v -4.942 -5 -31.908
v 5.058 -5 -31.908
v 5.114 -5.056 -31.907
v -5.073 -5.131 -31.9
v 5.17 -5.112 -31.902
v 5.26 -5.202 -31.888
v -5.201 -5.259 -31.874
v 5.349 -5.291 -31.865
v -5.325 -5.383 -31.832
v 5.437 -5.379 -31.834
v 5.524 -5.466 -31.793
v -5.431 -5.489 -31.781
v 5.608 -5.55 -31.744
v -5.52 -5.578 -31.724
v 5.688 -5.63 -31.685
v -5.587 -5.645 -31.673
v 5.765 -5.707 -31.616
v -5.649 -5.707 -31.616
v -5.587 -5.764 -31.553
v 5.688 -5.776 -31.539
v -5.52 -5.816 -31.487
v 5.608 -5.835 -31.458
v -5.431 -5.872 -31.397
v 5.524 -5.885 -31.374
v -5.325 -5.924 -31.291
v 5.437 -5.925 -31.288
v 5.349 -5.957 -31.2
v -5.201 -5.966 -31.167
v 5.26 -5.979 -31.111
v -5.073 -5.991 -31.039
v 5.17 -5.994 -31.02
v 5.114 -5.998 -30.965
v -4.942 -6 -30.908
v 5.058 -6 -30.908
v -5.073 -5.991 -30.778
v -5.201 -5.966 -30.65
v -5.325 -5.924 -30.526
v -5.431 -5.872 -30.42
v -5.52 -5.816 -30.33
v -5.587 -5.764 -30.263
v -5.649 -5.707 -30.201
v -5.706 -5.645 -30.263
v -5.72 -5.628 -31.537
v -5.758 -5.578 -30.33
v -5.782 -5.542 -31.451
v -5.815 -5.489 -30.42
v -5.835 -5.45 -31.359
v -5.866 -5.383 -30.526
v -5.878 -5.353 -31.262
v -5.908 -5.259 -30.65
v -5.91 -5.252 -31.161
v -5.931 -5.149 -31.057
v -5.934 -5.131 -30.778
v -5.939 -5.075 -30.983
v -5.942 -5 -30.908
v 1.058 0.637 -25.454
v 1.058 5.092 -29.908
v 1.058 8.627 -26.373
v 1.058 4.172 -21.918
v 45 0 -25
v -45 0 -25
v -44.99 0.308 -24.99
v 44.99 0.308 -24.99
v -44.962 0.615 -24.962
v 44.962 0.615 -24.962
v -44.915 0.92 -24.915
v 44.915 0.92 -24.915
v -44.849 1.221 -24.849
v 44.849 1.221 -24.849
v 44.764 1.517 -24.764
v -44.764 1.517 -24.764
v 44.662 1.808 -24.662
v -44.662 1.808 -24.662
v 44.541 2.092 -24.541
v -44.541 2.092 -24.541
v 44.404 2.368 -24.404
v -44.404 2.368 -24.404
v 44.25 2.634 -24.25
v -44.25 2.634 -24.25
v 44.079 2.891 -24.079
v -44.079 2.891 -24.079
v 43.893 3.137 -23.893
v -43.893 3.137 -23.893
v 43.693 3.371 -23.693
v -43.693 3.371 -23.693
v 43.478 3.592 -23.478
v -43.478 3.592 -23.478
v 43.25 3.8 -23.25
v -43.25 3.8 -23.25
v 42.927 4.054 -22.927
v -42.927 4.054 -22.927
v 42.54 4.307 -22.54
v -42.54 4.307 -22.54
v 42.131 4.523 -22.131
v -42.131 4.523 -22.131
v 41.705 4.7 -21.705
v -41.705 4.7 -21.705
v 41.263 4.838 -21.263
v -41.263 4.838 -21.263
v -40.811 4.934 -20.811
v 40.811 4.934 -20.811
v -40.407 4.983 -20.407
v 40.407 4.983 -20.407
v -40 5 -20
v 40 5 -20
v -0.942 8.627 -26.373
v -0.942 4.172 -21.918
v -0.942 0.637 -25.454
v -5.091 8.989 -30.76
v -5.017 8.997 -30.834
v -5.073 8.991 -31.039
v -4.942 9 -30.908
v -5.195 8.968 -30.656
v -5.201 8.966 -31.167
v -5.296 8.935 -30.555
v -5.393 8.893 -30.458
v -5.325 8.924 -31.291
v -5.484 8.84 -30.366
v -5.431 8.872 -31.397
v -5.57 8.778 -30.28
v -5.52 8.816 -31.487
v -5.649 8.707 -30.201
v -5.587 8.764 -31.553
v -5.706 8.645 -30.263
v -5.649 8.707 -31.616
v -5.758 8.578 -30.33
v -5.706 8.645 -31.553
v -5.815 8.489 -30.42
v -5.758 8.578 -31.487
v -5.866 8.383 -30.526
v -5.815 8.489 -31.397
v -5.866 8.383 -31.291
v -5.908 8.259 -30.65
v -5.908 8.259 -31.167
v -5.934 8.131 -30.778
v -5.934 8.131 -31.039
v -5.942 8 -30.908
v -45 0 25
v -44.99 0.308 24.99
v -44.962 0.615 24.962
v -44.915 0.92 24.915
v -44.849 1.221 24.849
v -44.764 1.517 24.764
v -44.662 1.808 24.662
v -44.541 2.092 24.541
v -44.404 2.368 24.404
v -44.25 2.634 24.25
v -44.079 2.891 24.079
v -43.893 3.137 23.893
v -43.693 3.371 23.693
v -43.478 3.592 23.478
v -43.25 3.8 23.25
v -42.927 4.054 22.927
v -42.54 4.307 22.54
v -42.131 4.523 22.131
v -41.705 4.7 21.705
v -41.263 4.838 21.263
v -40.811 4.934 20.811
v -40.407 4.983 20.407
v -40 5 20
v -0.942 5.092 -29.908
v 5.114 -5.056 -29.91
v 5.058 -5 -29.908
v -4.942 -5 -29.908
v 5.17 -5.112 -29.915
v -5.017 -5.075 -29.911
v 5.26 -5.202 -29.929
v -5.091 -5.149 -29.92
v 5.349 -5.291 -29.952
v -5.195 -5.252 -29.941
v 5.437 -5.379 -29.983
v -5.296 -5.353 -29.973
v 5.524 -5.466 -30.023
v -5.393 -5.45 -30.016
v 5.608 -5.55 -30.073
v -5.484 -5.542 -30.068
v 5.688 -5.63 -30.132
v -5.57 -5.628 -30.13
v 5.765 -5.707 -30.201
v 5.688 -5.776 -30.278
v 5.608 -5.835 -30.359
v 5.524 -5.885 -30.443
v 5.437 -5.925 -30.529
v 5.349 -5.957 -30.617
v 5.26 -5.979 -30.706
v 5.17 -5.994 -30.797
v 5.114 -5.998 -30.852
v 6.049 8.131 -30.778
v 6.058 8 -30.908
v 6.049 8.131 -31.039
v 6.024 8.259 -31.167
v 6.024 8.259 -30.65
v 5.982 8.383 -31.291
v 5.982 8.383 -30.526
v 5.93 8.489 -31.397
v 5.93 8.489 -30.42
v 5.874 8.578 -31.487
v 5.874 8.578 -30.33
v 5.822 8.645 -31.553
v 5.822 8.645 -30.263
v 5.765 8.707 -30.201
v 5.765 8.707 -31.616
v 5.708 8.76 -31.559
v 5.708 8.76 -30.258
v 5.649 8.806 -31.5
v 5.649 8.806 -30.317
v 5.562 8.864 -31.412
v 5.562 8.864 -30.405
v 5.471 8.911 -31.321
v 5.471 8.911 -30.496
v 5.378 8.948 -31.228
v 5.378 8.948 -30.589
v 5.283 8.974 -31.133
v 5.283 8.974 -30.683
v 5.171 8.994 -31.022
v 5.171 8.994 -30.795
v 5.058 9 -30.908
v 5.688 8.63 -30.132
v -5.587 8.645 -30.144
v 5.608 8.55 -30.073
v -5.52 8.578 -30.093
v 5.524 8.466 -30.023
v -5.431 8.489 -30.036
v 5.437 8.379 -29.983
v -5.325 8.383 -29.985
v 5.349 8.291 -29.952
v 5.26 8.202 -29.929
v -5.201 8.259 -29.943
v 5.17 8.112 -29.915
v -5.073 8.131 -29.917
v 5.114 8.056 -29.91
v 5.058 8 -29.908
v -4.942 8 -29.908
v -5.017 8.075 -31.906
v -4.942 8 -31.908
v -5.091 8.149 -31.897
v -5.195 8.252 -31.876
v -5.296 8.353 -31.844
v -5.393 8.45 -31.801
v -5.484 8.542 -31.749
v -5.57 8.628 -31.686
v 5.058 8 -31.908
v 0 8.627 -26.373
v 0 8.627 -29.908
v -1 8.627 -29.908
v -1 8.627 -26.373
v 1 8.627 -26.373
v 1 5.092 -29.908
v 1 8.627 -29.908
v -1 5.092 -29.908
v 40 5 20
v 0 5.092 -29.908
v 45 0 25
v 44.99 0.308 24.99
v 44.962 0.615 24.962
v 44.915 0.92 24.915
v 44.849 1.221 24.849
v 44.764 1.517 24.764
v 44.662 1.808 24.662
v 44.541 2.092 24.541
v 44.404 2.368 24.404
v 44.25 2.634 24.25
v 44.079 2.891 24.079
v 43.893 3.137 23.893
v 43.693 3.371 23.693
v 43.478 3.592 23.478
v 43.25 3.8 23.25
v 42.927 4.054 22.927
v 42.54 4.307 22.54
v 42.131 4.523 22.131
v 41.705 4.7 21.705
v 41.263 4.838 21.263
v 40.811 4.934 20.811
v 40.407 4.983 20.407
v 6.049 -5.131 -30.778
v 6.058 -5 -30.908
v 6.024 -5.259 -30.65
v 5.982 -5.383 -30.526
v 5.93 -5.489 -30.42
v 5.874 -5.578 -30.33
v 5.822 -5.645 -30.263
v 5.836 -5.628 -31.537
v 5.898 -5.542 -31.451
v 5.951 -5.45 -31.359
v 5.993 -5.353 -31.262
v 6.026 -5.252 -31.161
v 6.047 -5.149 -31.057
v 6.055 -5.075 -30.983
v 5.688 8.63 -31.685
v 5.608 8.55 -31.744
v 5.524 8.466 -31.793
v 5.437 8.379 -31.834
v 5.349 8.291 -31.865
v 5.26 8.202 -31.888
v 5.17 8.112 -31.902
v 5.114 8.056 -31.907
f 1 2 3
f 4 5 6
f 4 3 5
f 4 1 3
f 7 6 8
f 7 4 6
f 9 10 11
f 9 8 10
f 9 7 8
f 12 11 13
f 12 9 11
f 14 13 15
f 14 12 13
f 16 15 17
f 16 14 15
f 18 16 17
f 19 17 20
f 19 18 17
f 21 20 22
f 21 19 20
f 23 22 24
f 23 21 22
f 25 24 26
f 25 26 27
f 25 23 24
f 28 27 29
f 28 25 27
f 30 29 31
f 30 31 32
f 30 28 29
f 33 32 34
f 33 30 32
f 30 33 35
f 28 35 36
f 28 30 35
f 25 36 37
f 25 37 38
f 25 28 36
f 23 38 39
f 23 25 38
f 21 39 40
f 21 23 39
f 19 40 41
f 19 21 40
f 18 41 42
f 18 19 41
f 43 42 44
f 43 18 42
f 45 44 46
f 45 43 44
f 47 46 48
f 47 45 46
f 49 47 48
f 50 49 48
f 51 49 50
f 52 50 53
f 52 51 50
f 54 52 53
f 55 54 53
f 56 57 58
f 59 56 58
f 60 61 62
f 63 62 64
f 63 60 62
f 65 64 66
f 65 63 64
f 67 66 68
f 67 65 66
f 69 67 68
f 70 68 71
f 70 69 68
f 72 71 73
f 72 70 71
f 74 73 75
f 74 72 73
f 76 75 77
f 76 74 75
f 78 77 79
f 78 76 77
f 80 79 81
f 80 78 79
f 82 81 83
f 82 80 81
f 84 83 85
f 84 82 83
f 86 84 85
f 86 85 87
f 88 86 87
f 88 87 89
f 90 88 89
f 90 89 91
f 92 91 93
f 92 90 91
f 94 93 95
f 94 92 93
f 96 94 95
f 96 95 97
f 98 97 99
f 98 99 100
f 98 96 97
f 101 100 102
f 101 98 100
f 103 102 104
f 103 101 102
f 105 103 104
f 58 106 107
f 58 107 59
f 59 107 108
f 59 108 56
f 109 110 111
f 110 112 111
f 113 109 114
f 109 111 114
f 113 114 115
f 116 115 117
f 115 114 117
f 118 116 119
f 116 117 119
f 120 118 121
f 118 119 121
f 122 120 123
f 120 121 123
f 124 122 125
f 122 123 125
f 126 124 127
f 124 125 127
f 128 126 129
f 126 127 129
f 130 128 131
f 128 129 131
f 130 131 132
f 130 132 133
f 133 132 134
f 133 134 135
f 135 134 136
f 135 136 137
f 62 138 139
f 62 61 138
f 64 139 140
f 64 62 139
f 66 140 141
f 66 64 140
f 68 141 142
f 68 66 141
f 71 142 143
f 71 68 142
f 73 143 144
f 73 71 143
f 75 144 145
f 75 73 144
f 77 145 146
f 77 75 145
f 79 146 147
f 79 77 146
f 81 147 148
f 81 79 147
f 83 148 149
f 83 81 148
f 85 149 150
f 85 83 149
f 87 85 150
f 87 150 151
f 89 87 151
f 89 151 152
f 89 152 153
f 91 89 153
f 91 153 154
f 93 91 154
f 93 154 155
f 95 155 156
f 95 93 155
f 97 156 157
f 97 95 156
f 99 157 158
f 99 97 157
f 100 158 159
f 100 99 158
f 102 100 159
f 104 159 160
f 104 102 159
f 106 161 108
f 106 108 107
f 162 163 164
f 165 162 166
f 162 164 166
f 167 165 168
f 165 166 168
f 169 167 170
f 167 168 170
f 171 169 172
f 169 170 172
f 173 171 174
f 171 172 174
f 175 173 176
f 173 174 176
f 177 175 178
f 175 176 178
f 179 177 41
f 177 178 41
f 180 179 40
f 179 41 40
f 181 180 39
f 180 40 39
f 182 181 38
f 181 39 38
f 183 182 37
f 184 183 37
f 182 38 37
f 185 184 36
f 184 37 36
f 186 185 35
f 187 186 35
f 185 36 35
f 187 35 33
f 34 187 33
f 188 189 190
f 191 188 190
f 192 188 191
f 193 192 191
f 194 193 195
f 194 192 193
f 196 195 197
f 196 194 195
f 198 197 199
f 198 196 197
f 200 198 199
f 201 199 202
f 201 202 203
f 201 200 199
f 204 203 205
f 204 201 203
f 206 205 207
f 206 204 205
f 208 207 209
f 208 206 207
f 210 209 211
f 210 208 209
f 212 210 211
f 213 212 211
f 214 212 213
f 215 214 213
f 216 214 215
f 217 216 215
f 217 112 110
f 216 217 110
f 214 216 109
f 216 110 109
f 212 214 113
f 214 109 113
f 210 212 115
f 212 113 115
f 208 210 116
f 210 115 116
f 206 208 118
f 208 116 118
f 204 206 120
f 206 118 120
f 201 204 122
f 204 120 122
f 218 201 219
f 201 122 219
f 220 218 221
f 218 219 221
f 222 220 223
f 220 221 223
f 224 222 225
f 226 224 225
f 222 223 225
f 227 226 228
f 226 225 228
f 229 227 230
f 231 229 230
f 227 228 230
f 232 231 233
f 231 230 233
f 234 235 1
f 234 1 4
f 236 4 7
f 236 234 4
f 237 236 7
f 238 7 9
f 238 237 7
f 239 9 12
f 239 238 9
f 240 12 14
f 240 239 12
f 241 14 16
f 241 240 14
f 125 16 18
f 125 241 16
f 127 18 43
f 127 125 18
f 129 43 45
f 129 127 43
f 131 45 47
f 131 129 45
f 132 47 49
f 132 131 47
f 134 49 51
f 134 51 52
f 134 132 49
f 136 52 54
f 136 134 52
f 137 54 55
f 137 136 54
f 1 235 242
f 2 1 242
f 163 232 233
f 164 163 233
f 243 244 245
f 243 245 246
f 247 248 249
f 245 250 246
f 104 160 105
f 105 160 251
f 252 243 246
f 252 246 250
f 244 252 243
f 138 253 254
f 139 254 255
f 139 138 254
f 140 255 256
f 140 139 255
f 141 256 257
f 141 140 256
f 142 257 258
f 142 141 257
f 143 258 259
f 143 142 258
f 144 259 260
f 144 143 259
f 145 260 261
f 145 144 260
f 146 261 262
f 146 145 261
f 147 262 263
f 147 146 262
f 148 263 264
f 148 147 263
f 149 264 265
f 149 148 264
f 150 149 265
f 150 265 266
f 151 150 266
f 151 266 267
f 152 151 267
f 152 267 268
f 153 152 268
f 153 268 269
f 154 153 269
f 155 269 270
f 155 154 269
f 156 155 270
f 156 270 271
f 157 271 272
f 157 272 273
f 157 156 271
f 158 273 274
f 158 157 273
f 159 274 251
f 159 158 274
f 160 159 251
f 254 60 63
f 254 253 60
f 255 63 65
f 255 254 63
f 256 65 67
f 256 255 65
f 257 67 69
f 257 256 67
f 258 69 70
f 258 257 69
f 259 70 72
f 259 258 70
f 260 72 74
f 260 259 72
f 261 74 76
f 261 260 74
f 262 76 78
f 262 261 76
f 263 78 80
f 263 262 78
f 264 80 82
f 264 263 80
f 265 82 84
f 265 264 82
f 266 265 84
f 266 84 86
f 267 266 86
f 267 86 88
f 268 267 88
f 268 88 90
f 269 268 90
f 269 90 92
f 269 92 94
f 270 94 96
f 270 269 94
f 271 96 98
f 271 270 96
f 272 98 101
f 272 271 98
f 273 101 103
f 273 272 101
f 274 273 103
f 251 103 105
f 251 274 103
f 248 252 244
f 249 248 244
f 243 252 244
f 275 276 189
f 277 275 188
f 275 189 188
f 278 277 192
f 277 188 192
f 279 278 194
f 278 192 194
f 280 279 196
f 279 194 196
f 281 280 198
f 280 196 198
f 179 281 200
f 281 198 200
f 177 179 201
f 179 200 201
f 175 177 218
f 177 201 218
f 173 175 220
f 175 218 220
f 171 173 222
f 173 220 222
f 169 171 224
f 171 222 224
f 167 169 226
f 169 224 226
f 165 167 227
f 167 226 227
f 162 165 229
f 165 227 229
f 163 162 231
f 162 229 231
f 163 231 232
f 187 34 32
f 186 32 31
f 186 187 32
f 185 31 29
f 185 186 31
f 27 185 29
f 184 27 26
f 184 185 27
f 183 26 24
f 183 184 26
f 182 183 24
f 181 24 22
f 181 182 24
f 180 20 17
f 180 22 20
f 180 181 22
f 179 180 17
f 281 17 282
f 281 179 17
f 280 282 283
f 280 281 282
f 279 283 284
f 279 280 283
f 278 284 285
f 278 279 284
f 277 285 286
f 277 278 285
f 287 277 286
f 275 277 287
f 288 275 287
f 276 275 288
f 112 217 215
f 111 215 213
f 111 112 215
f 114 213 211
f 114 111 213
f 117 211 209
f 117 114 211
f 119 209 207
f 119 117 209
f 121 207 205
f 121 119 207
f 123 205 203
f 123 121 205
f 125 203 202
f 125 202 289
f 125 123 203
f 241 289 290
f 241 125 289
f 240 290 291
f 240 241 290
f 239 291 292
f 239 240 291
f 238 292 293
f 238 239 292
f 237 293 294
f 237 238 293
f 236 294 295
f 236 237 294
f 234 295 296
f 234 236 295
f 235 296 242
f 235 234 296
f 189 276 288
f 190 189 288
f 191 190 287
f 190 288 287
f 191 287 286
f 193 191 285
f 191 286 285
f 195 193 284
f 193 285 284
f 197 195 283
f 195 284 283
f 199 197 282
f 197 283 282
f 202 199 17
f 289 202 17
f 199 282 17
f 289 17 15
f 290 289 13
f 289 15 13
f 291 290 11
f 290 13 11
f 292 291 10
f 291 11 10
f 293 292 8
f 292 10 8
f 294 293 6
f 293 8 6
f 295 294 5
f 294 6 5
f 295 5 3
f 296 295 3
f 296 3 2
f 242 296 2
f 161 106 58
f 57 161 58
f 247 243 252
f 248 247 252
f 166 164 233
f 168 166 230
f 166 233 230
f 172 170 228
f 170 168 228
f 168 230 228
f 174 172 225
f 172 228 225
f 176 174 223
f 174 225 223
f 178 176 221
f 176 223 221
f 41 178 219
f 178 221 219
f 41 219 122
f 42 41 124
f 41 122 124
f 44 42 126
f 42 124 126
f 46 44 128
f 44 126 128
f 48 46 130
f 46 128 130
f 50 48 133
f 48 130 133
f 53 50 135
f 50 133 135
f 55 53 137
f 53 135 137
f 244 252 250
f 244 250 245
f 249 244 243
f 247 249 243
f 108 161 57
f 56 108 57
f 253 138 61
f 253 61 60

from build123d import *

# Parameters (mm, degrees)
F1_DEPTH     = 5
F3_DEPTH     = 15
F4_R         = 4.99999
F6_W         = 2
F6_H         = 5
F7_DEPTH     = 6.3
F10_DEPTH    = 9
F12_DEPTH    = 1
F13_DEPTH    = 1
F14_DEPTH    = 15
F15_R        = 0.99999
F16_T1_DEPTH = 16.00001
F16_T3_DEPTH = 7
F17_T1_DEPTH = 19
F17_T3_DEPTH = 7
F18_T1_DEPTH = 15.00001


# Not quite as in the source:
# - a fillet or chamfer that OpenCascade refuses, or shapes differently, is made with other operations: its cross-section is extruded or revolved along the edge and cut away or added
# - a fillet or chamfer is up to 0.001 mm smaller than in the source, because OpenCascade refuses the exact size


with BuildPart() as f1:
    # F0 (on Front) → F1 (new body)
    with BuildSketch(Plane.XZ):
        Polygon((45, 25), (-45, 25), (-45, -25), (-2.5, -25), (0, -25), (2.5, -25), (45, -25), align=None)
    extrude(amount=-F1_DEPTH)

    # F4 (radius 5 in the source; OpenCascade refuses exactly that, so slightly less here)
    f4_edges = [f1.edges().sort_by_distance(p)[0] for p in [
        (0, 5, 25),
        (-45, 5, 0),
        (0, 5, -25),
        (45, 5, 0),
    ]]
    fillet(f4_edges, radius=F4_R)


with BuildPart() as f3:
    # F2 (on face) → F3 (new body)
    with BuildSketch(Plane(origin=(0, 5, 0), x_dir=(-1, 0, 0), z_dir=(0, 1, 0))):
        Polygon((2.5, -30), (-2.5, -30), (-8.5, -30), (-8.5, -33), (8.5, -33), (8.5, -30), align=None)
    extrude(amount=-F3_DEPTH)


with BuildPart() as f7:
    # F6 (on face) → F7 (new body)
    with BuildSketch(Plane(origin=(0, 17.5, -17.5), x_dir=(1, 0, 0), z_dir=(0, -0.7071067812, 0.7071067812))):
        with Locations((0.0579425832, -15.0481848419)):
            Rectangle(F6_W, F6_H)
    extrude(amount=F7_DEPTH)


with BuildPart() as f10:
    # F9 (on Front) → F10 (new body)
    with BuildSketch(Plane.XZ):
        Polygon((1.0579425832, -29.9084404992), (-0.9420574168, -29.9084404992), (-5.9420574168, -29.9084404992), (-5.9420574168, -31.9084404992), (6.0579425832, -31.9084404992), (6.0579425832, -29.9084404992), align=None)
    extrude(amount=-F10_DEPTH)

    # F14 (add): a face of the model
    f14_faces = [f10.faces().sort_by_distance(p)[0] for p in [
        (0.0579425832, 9, -30.9084404992),
    ]]
    extrude(f14_faces, amount=-F14_DEPTH)

    # F15 (radius 1 in the source; OpenCascade refuses exactly that, so slightly less here)
    f15_edges = [f10.edges().sort_by_distance(p)[0] for p in [
        (6.057943, 9, -30.90844),
        (6.057943, 1.5, -29.90844),
        (6.057943, -6, -30.90844),
        (6.057943, 1.5, -31.90844),
    ]]
    fillet(f15_edges, radius=F15_R)

    # F16: fillet of radius 1 on 4 edges, made by hand

    # F16_s2 → F16_t1 (cut)
    with BuildSketch(Plane.YZ.offset(-8.4420574168)):
        with BuildLine():
            ThreePointArc((9, -30.9084404992), (8.7071067812, -30.201333718), (8, -29.9084404992))
            Line((8, -29.9084404992), (9, -29.9084404992))
            Line((9, -29.9084404992), (9, -30.9084404992))
        make_face()
        with BuildLine():
            ThreePointArc((9, -30.9084404992), (8.7071067812, -31.6155472804), (8, -31.9084404992))
            Line((8, -31.9084404992), (9, -31.9084404992))
            Line((9, -31.9084404992), (9, -30.9084404992))
        make_face()
    extrude(amount=F16_T1_DEPTH, mode=Mode.SUBTRACT)

    # F16_s4 → F16_t3 (cut)
    with BuildSketch(Plane.XY.offset(-34.4084404992)):
        with BuildLine():
            ThreePointArc((-4.9420574168, 9), (-5.649164198, 8.7071067812), (-5.9420574168, 8))
            Line((-5.9420574168, 8), (-5.9420574168, 9))
            Line((-5.9420574168, 9), (-4.9420574168, 9))
        make_face()
    extrude(amount=F16_T3_DEPTH, mode=Mode.SUBTRACT)

    # F17: fillet of radius 1 on 4 edges, made by hand

    # F17_s2 → F17_t1 (cut)
    with BuildSketch(Plane.XZ.offset(-10.5)):
        with BuildLine():
            ThreePointArc((-4.9420574168, -29.9084404992), (-5.649164198, -30.201333718), (-5.9420574168, -30.9084404992))
            Line((-5.9420574168, -30.9084404992), (-5.9420574168, -29.9084404992))
            Line((-5.9420574168, -29.9084404992), (-4.9420574168, -29.9084404992))
        make_face()
        with BuildLine():
            ThreePointArc((-4.9420574168, -31.9084404992), (-5.649164198, -31.6155472804), (-5.9420574168, -30.9084404992))
            Line((-5.9420574168, -30.9084404992), (-5.9420574168, -31.9084404992))
            Line((-5.9420574168, -31.9084404992), (-4.9420574168, -31.9084404992))
        make_face()
    extrude(amount=F17_T1_DEPTH, mode=Mode.SUBTRACT)

    # F17_s4 → F17_t3 (cut)
    with BuildSketch(Plane.XY.offset(-34.4084404992)):
        with BuildLine():
            ThreePointArc((-4.9420574168, -6), (-5.649164198, -5.7071067812), (-5.9420574168, -5))
            Line((-5.9420574168, -5), (-5.9420574168, -6))
            Line((-5.9420574168, -6), (-4.9420574168, -6))
        make_face()
    extrude(amount=F17_T3_DEPTH, mode=Mode.SUBTRACT)

    # F18: fillet of radius 1 on 4 edges, made by hand

    # F18_s2 → F18_t1 (cut)
    with BuildSketch(Plane.YZ.offset(-7.4420574168)):
        with BuildLine():
            ThreePointArc((-5, -31.9084404992), (-5.7071067812, -31.6155472804), (-6, -30.9084404992))
            Line((-6, -30.9084404992), (-6, -31.9084404992))
            Line((-6, -31.9084404992), (-5, -31.9084404992))
        make_face()
        with BuildLine():
            ThreePointArc((-5, -29.9084404992), (-5.7071067812, -30.201333718), (-6, -30.9084404992))
            Line((-6, -30.9084404992), (-6, -29.9084404992))
            Line((-6, -29.9084404992), (-5, -29.9084404992))
        make_face()
    extrude(amount=F18_T1_DEPTH, mode=Mode.SUBTRACT)


with BuildPart() as f12:
    # F11 (on Right) → F12 (new body)
    with BuildSketch(Plane.YZ):
        Polygon((8.6270934067, -29.9084404992), (8.6270934067, -26.3729065933), (5.0915595008, -29.9084404992), align=None)
    extrude(amount=F12_DEPTH)


with BuildPart() as f13:
    # F13 (new): a face of the model
    f13_faces = [f12.part.faces().sort_by_distance(p)[0] for p in [
        (0, 7.4485821048, -28.7299291972),
    ]]
    extrude(f13_faces, amount=F13_DEPTH)


solid = Compound([f1.part, f7.part, f10.part, f12.part, f13.part])
